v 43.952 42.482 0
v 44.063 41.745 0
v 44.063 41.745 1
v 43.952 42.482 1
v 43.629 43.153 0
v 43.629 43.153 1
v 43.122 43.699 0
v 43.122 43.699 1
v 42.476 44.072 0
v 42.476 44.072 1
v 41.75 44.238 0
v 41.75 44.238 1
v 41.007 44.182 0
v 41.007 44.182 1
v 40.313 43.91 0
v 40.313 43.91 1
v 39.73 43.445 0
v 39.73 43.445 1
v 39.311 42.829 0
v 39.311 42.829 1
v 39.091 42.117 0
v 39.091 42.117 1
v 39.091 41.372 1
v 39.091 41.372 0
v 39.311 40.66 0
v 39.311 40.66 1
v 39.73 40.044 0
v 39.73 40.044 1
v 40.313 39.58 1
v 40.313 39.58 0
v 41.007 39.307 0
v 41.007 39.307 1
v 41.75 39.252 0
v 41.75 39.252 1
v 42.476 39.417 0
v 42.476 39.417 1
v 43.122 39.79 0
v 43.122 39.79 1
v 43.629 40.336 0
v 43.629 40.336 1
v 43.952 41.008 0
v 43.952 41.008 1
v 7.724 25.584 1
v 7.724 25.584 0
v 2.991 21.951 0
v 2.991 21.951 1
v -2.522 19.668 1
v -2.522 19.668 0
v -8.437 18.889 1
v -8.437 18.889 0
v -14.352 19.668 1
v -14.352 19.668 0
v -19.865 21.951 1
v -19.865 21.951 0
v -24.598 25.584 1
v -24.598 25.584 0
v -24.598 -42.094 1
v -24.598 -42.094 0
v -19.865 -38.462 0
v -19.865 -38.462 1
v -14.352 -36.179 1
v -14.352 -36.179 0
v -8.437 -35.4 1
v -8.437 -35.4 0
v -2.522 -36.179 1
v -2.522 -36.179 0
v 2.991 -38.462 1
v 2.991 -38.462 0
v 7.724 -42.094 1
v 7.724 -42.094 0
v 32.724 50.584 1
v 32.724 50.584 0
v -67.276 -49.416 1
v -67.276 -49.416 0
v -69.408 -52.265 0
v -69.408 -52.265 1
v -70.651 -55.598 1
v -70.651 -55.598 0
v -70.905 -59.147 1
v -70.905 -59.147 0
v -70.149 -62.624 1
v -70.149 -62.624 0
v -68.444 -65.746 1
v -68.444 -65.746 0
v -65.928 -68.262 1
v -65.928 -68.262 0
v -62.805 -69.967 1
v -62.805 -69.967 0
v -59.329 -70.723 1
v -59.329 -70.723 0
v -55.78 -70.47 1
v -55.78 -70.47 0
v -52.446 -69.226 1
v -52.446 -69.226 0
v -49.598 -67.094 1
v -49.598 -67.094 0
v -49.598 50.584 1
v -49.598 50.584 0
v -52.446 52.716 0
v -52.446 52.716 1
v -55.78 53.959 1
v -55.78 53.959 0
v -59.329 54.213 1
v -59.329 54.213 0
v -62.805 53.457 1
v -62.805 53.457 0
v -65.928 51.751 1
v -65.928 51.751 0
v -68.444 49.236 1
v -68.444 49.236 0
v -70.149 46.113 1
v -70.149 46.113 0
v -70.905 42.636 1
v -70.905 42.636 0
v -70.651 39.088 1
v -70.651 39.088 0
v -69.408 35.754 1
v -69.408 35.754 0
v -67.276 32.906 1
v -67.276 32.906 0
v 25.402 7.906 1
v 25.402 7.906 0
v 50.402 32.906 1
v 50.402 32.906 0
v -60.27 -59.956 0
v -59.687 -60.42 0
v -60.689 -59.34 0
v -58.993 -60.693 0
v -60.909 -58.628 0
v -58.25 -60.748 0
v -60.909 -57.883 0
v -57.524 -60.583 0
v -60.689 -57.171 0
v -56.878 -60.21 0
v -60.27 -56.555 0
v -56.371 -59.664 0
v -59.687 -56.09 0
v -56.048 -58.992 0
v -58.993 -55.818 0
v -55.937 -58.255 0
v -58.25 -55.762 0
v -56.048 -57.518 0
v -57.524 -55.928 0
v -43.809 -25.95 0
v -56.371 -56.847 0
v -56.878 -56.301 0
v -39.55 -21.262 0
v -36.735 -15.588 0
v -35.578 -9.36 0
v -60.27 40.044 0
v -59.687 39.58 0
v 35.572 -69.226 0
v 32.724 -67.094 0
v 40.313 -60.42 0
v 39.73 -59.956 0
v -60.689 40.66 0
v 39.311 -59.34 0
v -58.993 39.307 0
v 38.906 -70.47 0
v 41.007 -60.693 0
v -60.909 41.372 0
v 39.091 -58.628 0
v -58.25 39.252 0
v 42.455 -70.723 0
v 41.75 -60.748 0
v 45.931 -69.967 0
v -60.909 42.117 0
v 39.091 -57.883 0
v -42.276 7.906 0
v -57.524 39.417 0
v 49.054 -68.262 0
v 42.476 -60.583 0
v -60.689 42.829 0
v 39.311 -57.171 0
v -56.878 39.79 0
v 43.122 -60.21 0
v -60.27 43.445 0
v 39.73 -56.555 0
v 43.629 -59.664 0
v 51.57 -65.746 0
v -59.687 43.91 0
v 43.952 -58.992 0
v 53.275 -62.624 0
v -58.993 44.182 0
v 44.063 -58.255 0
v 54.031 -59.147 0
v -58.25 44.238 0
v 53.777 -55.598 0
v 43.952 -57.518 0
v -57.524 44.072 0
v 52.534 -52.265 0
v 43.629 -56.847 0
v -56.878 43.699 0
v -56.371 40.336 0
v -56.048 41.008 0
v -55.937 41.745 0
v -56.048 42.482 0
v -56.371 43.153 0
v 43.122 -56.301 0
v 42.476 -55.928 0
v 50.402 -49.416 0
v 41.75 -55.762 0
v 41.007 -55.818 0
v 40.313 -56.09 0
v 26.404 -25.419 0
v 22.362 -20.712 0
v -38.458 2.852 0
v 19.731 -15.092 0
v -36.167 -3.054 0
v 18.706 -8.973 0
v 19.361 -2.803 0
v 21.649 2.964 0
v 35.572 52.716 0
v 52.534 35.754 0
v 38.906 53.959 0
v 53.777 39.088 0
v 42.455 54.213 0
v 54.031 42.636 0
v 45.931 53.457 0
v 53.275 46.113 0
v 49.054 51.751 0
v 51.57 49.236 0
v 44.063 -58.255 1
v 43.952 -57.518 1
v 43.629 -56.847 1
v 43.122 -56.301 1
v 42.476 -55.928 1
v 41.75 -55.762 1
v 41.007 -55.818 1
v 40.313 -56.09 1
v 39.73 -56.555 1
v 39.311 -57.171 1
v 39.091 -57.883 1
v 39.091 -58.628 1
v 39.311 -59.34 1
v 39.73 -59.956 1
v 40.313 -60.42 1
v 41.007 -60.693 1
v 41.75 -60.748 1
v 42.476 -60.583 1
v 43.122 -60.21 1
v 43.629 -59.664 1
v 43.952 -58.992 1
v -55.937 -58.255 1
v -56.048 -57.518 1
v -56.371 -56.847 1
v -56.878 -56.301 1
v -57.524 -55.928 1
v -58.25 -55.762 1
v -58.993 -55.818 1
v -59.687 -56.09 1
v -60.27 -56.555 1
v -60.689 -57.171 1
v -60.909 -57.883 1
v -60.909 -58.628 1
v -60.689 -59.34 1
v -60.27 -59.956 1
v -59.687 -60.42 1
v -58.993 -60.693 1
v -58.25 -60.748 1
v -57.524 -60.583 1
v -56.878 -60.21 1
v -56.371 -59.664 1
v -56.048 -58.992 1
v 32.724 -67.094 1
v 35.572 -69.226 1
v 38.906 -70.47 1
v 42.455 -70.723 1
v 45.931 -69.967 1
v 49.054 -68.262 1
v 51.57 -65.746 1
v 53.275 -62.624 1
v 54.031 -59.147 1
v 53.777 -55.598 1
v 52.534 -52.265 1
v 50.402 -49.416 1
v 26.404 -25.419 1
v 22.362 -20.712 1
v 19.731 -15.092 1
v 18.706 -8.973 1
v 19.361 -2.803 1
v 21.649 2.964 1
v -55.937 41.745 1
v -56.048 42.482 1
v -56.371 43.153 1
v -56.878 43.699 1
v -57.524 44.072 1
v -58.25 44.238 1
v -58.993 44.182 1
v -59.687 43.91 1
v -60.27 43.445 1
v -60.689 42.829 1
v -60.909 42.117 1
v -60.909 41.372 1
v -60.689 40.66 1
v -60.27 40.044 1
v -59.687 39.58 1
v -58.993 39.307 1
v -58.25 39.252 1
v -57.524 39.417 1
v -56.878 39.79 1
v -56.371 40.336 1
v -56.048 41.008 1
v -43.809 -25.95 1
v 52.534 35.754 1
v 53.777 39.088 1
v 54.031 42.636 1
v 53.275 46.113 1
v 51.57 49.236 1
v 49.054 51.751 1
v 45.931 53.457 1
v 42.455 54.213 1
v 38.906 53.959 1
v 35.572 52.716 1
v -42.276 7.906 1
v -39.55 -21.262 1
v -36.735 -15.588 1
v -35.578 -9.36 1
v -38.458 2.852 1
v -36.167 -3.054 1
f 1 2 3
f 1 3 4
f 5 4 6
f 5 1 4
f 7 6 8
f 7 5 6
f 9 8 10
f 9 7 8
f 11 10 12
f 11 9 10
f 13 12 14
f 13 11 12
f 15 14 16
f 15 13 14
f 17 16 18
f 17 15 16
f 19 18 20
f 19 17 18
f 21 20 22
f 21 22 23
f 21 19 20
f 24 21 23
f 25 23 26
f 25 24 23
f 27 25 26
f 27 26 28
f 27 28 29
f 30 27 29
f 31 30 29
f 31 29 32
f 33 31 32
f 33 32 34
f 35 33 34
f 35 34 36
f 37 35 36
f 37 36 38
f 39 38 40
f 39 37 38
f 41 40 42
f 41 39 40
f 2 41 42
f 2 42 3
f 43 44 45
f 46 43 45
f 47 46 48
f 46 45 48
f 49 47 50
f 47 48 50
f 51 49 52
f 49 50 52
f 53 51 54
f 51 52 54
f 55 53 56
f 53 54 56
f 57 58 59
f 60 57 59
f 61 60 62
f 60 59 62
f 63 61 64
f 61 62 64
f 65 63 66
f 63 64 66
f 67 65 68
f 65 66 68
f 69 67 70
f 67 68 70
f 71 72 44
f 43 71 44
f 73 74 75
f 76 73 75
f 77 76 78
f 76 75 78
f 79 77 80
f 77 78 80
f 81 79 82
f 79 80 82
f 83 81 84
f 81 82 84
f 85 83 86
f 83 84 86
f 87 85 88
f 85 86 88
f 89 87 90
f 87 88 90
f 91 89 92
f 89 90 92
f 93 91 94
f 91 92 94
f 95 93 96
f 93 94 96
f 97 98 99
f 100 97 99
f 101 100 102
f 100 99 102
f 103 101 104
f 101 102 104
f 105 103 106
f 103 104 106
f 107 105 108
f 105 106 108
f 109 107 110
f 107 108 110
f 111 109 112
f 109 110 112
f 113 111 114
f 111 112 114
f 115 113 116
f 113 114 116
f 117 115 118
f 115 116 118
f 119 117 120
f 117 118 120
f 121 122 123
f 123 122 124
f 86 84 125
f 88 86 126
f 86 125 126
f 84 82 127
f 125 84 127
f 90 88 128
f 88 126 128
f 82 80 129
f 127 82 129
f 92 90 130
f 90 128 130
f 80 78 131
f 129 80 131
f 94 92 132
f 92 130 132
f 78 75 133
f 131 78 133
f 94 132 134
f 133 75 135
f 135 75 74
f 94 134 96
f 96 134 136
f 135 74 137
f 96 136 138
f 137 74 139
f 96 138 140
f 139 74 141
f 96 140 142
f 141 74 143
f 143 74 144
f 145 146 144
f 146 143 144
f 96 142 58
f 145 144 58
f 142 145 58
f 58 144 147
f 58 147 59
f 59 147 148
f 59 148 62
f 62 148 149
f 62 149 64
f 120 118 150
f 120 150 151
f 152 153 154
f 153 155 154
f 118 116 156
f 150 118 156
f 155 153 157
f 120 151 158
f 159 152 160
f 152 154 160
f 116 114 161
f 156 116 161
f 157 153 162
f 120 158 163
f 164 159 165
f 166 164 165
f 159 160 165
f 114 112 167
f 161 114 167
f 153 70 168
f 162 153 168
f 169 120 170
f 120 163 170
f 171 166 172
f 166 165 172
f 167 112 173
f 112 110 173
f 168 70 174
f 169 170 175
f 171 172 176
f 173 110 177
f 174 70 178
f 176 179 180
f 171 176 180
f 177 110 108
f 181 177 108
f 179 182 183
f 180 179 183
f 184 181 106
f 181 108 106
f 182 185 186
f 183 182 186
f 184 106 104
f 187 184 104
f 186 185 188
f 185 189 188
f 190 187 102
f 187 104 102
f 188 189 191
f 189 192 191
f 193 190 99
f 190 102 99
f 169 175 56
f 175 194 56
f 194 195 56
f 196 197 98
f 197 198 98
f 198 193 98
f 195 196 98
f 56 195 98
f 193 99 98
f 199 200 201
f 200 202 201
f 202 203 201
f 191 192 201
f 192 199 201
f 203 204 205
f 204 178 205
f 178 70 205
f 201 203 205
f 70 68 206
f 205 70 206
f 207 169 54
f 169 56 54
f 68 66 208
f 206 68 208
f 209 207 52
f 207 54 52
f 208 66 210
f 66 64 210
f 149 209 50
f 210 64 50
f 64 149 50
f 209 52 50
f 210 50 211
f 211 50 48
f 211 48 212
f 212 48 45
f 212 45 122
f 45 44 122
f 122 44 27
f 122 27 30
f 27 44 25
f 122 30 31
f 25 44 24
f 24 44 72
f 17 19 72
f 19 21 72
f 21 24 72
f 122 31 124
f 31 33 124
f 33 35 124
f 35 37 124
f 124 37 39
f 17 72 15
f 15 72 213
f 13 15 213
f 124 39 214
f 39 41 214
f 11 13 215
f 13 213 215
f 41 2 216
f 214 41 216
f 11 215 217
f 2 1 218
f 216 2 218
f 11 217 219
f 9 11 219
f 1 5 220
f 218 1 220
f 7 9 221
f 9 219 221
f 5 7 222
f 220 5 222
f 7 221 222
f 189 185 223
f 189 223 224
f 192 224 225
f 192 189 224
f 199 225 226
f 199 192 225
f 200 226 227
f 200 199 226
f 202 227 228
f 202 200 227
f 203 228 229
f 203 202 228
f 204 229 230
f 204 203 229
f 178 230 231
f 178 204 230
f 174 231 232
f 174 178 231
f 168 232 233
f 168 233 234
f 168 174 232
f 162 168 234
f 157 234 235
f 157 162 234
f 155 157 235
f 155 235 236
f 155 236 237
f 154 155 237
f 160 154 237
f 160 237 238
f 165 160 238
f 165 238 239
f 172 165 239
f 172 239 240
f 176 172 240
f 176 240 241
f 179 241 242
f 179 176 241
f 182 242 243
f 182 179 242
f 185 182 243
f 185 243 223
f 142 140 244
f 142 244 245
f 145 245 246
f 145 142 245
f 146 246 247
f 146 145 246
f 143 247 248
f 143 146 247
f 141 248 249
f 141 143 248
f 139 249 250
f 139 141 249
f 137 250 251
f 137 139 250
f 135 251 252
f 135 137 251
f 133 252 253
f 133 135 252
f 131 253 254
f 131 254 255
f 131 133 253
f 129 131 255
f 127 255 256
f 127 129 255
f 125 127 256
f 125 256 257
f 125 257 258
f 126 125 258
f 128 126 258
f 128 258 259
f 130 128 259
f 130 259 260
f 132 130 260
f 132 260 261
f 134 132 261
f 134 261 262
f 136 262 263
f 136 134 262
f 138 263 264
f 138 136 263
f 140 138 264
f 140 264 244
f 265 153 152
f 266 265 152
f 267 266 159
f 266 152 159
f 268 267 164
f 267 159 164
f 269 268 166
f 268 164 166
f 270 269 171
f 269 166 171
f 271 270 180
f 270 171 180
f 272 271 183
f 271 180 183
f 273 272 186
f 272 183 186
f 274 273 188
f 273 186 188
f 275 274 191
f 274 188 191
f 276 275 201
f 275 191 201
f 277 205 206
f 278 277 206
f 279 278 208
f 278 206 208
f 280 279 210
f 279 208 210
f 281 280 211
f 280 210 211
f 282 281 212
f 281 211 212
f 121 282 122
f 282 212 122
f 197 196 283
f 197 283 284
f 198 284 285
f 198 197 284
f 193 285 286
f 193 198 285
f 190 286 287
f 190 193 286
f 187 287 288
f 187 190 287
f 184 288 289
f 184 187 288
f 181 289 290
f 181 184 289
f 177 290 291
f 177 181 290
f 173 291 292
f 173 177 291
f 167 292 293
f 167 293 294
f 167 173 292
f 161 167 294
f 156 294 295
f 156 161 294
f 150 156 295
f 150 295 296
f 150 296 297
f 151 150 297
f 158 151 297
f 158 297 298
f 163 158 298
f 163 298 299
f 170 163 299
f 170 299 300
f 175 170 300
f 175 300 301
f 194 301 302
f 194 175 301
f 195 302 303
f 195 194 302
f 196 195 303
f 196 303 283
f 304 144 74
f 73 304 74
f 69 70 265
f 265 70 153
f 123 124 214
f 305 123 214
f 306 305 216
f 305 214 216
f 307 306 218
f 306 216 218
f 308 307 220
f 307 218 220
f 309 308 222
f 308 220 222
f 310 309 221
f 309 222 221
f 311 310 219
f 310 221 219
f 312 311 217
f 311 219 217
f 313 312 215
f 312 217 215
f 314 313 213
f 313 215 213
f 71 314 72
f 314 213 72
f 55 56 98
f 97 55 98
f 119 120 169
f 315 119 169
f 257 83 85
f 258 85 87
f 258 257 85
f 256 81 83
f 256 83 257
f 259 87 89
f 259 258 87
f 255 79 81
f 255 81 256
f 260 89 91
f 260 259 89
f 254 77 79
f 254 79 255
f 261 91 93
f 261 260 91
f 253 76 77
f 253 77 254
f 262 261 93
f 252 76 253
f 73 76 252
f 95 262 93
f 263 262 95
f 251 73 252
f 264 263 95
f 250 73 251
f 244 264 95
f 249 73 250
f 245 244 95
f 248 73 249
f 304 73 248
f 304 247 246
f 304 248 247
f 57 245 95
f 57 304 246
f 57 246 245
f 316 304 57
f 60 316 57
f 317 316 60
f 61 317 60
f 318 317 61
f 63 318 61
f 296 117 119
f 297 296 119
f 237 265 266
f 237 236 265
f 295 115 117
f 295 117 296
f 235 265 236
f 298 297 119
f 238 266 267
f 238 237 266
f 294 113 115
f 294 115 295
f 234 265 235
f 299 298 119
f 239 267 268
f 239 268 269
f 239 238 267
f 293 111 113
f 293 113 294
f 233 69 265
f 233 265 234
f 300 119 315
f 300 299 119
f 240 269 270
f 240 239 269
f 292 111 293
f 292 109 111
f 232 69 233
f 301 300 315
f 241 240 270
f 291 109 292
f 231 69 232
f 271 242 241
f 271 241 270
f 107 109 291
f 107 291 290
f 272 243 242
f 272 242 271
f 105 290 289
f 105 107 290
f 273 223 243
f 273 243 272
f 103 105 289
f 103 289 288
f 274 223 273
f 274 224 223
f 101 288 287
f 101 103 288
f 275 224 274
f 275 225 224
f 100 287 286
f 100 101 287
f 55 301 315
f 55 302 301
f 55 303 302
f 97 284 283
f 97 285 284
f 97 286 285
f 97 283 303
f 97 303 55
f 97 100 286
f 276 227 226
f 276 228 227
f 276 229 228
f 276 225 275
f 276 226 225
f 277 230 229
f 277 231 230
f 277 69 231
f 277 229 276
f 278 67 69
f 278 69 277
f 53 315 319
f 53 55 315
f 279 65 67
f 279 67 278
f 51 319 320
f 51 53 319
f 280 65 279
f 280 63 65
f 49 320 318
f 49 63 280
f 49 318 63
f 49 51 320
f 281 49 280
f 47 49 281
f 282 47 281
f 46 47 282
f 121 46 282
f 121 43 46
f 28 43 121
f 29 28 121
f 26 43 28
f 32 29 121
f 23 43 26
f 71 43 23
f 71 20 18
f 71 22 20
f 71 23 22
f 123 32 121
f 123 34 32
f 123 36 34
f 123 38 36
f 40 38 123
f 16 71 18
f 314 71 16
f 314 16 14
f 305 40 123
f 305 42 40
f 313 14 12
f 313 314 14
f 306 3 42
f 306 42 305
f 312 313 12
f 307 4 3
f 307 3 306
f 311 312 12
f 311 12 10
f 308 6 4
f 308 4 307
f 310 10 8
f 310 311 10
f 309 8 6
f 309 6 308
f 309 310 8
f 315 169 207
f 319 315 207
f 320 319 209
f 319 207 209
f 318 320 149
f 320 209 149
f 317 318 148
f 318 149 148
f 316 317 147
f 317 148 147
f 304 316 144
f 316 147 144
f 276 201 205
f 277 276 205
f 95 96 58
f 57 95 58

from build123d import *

# Parameters (mm, degrees)
F0_R     = 2.5
F1_DEPTH = 1


with BuildPart() as f1:
    # F0 (on Top) → F1 (new body)
    with BuildSketch(Plane.XY):
        with BuildLine():
            Line((-24.598089, 25.583514), (-49.598089, 50.583514))
            ThreePointArc((-49.598089, 50.583514), (-67.275759, 50.583514), (-67.275759, 32.905845))
            Line((-67.275759, 32.905845), (-42.275759, 7.905845))
            ThreePointArc((-42.275759, 7.905845), (-35.577566, -9.360294), (-43.809394, -25.95012))
            Line((-43.809394, -25.95012), (-67.275759, -49.416486))
            ThreePointArc((-67.275759, -49.416486), (-67.275759, -67.094155), (-49.598089, -67.094155))
            Line((-49.598089, -67.094155), (-24.598089, -42.094155))
            ThreePointArc((-24.598089, -42.094155), (-8.436924, -35.399981), (7.724241, -42.094155))
            Line((7.724241, -42.094155), (32.724241, -67.094155))
            ThreePointArc((32.724241, -67.094155), (50.401911, -67.094155), (50.401911, -49.416486))
            Line((50.401911, -49.416486), (26.404182, -25.418757))
            ThreePointArc((26.404182, -25.418757), (18.705964, -8.972916), (25.401911, 7.905845))
            Line((25.401911, 7.905845), (50.401911, 32.905845))
            ThreePointArc((50.401911, 32.905845), (50.401911, 50.583514), (32.724241, 50.583514))
            Line((32.724241, 50.583514), (7.724241, 25.583514))
            ThreePointArc((7.724241, 25.583514), (-8.436924, 18.889341), (-24.598089, 25.583514))
        make_face()
        with Locations((-58.436924, -58.25532)):
            Circle(F0_R, mode=Mode.SUBTRACT)
        with Locations((41.563076, -58.25532)):
            Circle(F0_R, mode=Mode.SUBTRACT)
        with Locations((-58.436924, 41.74468)):
            Circle(F0_R, mode=Mode.SUBTRACT)
        with Locations((41.563076, 41.74468)):
            Circle(F0_R, mode=Mode.SUBTRACT)
    extrude(amount=F1_DEPTH)


solid = f1.part
